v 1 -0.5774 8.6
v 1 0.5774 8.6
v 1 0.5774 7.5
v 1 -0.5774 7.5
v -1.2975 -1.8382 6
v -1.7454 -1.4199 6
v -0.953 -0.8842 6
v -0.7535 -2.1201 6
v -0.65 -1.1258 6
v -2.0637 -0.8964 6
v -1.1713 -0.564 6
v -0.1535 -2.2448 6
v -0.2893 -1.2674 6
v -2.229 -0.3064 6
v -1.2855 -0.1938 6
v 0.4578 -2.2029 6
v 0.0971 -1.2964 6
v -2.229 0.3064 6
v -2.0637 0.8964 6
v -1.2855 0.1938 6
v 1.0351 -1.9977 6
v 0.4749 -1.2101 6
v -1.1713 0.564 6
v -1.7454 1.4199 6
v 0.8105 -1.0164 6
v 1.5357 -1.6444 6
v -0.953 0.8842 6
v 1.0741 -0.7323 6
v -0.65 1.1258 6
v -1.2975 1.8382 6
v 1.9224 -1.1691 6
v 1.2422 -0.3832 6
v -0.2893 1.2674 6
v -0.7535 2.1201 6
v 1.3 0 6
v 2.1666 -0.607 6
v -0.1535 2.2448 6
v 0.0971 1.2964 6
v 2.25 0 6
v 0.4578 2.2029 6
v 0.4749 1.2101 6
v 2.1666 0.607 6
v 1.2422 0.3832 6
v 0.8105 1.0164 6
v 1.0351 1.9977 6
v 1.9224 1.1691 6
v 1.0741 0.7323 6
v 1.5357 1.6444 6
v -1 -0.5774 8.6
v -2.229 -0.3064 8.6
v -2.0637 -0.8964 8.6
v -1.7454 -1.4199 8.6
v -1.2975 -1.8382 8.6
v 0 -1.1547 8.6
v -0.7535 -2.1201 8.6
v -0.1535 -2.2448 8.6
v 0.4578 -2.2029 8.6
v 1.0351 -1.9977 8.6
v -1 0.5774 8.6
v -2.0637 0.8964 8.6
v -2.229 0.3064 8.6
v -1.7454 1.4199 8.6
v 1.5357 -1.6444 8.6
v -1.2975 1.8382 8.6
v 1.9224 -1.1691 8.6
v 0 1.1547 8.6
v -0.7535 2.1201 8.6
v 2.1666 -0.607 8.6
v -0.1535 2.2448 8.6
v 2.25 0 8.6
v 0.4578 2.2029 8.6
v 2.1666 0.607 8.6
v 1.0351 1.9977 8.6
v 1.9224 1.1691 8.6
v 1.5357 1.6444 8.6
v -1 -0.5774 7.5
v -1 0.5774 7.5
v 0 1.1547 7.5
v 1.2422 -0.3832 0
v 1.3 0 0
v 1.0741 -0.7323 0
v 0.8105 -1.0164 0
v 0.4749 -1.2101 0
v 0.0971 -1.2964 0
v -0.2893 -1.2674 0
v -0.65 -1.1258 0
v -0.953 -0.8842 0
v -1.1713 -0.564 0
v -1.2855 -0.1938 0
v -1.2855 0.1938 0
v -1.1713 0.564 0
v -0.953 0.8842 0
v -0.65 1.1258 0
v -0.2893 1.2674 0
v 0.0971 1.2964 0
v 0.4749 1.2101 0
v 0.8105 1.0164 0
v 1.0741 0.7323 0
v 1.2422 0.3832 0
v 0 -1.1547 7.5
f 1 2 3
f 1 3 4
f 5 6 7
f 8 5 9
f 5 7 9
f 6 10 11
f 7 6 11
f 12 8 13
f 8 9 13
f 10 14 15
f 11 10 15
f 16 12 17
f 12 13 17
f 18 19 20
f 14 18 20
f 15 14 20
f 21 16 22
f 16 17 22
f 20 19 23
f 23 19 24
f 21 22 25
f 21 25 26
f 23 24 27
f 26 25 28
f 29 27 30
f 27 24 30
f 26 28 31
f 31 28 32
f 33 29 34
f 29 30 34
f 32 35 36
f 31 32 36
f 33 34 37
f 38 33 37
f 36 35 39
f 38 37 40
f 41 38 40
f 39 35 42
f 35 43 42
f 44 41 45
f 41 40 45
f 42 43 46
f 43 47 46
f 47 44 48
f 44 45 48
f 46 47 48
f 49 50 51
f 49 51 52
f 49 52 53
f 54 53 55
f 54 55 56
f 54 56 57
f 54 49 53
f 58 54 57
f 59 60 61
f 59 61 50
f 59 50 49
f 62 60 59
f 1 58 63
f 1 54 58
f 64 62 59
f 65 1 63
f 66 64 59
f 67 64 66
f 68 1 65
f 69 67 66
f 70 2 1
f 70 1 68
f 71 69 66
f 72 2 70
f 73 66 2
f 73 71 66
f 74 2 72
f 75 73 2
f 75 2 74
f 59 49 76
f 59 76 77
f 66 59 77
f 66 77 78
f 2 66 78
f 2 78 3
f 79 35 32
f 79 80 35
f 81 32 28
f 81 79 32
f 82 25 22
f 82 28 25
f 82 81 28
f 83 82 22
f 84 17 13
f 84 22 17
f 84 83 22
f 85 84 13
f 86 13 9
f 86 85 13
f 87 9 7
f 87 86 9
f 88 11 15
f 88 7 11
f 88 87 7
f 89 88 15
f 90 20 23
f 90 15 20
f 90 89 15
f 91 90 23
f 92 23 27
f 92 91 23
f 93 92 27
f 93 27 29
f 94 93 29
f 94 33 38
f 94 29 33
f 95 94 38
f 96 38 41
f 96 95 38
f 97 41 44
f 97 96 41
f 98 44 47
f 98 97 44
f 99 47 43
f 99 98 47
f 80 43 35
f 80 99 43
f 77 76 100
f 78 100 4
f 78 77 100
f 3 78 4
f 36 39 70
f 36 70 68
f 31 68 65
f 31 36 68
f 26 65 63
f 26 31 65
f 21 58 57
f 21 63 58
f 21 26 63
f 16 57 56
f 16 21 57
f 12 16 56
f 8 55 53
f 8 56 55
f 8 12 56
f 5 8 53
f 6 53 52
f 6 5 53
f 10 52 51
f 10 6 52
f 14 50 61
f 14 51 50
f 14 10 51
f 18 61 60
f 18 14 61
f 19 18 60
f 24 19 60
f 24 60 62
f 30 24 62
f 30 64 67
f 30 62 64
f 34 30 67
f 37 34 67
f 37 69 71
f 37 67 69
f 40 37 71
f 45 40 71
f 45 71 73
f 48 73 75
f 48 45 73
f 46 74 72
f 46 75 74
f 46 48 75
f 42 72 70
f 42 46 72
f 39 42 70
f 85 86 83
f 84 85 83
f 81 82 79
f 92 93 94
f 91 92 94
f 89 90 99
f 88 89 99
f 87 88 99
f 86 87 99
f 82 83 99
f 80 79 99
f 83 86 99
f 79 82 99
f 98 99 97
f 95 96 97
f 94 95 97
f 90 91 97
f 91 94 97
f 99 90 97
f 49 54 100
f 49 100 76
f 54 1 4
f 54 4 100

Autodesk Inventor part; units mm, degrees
ref_plane "YZ Plane" through (0, 0, 0) normal (1, 0, 0) x (0, 1, 0)
ref_plane "XZ Plane" through (0, 0, 0) normal (0, 1, 0) x (-1, 0, 0)
ref_plane "XY Plane" through (0, 0, 0) normal (0, 0, 1) x (1, 0, 0)
sketch "スケッチ1" plane through (0, 0, 0) normal (0, 0, 1) x (1, 0, 0)
  circle A0 centre (0, 0) radius 1.3
  dimension "d0" = 2.6
extrude "押し出し1" add sketch "スケッチ1" along normal blind 6
sketch "スケッチ2" plane through (0, 0, 6) normal (0, 0, 1) x (1, 0, 0)
  circle A0 centre (0, 0) radius 1.3 projected
  circle A1 centre (0, 0) radius 2.25
  dimension "d3" = 4.5
extrude "押し出し2" add sketch "スケッチ2" along normal blind 2.6 contours A0 | A1
sketch "スケッチ3" plane through (0, 0, 8.6) normal (0, 0, 1) x (1, 0, 0)
  circle A0 centre (0, 0) radius 2.25 projected
  circle A1 centre (0, 0) radius 1.3 projected
  line L0 (0, 1.1547) -> (1, 0.5774)
  line L1 (1, 0.5774) -> (1, -0.5774)
  line L2 (1, -0.5774) -> (0, -1.1547)
  line L3 (0, -1.1547) -> (-1, -0.5774)
  line L4 (-1, -0.5774) -> (-1, 0.5774)
  line L5 (-1, 0.5774) -> (0, 1.1547)
  dimension "d6" = 2
extrude "押し出し3" cut sketch "スケッチ3" against normal blind 1.1 contours L0 L1 L2 L3 L4 L5
thread "ねじ1" size "M2.6x0.45" class "6g" standard "ANSI Metric M Profile" full length
properties part number "m2.6 6mm キャップボルト" material "鋼"
